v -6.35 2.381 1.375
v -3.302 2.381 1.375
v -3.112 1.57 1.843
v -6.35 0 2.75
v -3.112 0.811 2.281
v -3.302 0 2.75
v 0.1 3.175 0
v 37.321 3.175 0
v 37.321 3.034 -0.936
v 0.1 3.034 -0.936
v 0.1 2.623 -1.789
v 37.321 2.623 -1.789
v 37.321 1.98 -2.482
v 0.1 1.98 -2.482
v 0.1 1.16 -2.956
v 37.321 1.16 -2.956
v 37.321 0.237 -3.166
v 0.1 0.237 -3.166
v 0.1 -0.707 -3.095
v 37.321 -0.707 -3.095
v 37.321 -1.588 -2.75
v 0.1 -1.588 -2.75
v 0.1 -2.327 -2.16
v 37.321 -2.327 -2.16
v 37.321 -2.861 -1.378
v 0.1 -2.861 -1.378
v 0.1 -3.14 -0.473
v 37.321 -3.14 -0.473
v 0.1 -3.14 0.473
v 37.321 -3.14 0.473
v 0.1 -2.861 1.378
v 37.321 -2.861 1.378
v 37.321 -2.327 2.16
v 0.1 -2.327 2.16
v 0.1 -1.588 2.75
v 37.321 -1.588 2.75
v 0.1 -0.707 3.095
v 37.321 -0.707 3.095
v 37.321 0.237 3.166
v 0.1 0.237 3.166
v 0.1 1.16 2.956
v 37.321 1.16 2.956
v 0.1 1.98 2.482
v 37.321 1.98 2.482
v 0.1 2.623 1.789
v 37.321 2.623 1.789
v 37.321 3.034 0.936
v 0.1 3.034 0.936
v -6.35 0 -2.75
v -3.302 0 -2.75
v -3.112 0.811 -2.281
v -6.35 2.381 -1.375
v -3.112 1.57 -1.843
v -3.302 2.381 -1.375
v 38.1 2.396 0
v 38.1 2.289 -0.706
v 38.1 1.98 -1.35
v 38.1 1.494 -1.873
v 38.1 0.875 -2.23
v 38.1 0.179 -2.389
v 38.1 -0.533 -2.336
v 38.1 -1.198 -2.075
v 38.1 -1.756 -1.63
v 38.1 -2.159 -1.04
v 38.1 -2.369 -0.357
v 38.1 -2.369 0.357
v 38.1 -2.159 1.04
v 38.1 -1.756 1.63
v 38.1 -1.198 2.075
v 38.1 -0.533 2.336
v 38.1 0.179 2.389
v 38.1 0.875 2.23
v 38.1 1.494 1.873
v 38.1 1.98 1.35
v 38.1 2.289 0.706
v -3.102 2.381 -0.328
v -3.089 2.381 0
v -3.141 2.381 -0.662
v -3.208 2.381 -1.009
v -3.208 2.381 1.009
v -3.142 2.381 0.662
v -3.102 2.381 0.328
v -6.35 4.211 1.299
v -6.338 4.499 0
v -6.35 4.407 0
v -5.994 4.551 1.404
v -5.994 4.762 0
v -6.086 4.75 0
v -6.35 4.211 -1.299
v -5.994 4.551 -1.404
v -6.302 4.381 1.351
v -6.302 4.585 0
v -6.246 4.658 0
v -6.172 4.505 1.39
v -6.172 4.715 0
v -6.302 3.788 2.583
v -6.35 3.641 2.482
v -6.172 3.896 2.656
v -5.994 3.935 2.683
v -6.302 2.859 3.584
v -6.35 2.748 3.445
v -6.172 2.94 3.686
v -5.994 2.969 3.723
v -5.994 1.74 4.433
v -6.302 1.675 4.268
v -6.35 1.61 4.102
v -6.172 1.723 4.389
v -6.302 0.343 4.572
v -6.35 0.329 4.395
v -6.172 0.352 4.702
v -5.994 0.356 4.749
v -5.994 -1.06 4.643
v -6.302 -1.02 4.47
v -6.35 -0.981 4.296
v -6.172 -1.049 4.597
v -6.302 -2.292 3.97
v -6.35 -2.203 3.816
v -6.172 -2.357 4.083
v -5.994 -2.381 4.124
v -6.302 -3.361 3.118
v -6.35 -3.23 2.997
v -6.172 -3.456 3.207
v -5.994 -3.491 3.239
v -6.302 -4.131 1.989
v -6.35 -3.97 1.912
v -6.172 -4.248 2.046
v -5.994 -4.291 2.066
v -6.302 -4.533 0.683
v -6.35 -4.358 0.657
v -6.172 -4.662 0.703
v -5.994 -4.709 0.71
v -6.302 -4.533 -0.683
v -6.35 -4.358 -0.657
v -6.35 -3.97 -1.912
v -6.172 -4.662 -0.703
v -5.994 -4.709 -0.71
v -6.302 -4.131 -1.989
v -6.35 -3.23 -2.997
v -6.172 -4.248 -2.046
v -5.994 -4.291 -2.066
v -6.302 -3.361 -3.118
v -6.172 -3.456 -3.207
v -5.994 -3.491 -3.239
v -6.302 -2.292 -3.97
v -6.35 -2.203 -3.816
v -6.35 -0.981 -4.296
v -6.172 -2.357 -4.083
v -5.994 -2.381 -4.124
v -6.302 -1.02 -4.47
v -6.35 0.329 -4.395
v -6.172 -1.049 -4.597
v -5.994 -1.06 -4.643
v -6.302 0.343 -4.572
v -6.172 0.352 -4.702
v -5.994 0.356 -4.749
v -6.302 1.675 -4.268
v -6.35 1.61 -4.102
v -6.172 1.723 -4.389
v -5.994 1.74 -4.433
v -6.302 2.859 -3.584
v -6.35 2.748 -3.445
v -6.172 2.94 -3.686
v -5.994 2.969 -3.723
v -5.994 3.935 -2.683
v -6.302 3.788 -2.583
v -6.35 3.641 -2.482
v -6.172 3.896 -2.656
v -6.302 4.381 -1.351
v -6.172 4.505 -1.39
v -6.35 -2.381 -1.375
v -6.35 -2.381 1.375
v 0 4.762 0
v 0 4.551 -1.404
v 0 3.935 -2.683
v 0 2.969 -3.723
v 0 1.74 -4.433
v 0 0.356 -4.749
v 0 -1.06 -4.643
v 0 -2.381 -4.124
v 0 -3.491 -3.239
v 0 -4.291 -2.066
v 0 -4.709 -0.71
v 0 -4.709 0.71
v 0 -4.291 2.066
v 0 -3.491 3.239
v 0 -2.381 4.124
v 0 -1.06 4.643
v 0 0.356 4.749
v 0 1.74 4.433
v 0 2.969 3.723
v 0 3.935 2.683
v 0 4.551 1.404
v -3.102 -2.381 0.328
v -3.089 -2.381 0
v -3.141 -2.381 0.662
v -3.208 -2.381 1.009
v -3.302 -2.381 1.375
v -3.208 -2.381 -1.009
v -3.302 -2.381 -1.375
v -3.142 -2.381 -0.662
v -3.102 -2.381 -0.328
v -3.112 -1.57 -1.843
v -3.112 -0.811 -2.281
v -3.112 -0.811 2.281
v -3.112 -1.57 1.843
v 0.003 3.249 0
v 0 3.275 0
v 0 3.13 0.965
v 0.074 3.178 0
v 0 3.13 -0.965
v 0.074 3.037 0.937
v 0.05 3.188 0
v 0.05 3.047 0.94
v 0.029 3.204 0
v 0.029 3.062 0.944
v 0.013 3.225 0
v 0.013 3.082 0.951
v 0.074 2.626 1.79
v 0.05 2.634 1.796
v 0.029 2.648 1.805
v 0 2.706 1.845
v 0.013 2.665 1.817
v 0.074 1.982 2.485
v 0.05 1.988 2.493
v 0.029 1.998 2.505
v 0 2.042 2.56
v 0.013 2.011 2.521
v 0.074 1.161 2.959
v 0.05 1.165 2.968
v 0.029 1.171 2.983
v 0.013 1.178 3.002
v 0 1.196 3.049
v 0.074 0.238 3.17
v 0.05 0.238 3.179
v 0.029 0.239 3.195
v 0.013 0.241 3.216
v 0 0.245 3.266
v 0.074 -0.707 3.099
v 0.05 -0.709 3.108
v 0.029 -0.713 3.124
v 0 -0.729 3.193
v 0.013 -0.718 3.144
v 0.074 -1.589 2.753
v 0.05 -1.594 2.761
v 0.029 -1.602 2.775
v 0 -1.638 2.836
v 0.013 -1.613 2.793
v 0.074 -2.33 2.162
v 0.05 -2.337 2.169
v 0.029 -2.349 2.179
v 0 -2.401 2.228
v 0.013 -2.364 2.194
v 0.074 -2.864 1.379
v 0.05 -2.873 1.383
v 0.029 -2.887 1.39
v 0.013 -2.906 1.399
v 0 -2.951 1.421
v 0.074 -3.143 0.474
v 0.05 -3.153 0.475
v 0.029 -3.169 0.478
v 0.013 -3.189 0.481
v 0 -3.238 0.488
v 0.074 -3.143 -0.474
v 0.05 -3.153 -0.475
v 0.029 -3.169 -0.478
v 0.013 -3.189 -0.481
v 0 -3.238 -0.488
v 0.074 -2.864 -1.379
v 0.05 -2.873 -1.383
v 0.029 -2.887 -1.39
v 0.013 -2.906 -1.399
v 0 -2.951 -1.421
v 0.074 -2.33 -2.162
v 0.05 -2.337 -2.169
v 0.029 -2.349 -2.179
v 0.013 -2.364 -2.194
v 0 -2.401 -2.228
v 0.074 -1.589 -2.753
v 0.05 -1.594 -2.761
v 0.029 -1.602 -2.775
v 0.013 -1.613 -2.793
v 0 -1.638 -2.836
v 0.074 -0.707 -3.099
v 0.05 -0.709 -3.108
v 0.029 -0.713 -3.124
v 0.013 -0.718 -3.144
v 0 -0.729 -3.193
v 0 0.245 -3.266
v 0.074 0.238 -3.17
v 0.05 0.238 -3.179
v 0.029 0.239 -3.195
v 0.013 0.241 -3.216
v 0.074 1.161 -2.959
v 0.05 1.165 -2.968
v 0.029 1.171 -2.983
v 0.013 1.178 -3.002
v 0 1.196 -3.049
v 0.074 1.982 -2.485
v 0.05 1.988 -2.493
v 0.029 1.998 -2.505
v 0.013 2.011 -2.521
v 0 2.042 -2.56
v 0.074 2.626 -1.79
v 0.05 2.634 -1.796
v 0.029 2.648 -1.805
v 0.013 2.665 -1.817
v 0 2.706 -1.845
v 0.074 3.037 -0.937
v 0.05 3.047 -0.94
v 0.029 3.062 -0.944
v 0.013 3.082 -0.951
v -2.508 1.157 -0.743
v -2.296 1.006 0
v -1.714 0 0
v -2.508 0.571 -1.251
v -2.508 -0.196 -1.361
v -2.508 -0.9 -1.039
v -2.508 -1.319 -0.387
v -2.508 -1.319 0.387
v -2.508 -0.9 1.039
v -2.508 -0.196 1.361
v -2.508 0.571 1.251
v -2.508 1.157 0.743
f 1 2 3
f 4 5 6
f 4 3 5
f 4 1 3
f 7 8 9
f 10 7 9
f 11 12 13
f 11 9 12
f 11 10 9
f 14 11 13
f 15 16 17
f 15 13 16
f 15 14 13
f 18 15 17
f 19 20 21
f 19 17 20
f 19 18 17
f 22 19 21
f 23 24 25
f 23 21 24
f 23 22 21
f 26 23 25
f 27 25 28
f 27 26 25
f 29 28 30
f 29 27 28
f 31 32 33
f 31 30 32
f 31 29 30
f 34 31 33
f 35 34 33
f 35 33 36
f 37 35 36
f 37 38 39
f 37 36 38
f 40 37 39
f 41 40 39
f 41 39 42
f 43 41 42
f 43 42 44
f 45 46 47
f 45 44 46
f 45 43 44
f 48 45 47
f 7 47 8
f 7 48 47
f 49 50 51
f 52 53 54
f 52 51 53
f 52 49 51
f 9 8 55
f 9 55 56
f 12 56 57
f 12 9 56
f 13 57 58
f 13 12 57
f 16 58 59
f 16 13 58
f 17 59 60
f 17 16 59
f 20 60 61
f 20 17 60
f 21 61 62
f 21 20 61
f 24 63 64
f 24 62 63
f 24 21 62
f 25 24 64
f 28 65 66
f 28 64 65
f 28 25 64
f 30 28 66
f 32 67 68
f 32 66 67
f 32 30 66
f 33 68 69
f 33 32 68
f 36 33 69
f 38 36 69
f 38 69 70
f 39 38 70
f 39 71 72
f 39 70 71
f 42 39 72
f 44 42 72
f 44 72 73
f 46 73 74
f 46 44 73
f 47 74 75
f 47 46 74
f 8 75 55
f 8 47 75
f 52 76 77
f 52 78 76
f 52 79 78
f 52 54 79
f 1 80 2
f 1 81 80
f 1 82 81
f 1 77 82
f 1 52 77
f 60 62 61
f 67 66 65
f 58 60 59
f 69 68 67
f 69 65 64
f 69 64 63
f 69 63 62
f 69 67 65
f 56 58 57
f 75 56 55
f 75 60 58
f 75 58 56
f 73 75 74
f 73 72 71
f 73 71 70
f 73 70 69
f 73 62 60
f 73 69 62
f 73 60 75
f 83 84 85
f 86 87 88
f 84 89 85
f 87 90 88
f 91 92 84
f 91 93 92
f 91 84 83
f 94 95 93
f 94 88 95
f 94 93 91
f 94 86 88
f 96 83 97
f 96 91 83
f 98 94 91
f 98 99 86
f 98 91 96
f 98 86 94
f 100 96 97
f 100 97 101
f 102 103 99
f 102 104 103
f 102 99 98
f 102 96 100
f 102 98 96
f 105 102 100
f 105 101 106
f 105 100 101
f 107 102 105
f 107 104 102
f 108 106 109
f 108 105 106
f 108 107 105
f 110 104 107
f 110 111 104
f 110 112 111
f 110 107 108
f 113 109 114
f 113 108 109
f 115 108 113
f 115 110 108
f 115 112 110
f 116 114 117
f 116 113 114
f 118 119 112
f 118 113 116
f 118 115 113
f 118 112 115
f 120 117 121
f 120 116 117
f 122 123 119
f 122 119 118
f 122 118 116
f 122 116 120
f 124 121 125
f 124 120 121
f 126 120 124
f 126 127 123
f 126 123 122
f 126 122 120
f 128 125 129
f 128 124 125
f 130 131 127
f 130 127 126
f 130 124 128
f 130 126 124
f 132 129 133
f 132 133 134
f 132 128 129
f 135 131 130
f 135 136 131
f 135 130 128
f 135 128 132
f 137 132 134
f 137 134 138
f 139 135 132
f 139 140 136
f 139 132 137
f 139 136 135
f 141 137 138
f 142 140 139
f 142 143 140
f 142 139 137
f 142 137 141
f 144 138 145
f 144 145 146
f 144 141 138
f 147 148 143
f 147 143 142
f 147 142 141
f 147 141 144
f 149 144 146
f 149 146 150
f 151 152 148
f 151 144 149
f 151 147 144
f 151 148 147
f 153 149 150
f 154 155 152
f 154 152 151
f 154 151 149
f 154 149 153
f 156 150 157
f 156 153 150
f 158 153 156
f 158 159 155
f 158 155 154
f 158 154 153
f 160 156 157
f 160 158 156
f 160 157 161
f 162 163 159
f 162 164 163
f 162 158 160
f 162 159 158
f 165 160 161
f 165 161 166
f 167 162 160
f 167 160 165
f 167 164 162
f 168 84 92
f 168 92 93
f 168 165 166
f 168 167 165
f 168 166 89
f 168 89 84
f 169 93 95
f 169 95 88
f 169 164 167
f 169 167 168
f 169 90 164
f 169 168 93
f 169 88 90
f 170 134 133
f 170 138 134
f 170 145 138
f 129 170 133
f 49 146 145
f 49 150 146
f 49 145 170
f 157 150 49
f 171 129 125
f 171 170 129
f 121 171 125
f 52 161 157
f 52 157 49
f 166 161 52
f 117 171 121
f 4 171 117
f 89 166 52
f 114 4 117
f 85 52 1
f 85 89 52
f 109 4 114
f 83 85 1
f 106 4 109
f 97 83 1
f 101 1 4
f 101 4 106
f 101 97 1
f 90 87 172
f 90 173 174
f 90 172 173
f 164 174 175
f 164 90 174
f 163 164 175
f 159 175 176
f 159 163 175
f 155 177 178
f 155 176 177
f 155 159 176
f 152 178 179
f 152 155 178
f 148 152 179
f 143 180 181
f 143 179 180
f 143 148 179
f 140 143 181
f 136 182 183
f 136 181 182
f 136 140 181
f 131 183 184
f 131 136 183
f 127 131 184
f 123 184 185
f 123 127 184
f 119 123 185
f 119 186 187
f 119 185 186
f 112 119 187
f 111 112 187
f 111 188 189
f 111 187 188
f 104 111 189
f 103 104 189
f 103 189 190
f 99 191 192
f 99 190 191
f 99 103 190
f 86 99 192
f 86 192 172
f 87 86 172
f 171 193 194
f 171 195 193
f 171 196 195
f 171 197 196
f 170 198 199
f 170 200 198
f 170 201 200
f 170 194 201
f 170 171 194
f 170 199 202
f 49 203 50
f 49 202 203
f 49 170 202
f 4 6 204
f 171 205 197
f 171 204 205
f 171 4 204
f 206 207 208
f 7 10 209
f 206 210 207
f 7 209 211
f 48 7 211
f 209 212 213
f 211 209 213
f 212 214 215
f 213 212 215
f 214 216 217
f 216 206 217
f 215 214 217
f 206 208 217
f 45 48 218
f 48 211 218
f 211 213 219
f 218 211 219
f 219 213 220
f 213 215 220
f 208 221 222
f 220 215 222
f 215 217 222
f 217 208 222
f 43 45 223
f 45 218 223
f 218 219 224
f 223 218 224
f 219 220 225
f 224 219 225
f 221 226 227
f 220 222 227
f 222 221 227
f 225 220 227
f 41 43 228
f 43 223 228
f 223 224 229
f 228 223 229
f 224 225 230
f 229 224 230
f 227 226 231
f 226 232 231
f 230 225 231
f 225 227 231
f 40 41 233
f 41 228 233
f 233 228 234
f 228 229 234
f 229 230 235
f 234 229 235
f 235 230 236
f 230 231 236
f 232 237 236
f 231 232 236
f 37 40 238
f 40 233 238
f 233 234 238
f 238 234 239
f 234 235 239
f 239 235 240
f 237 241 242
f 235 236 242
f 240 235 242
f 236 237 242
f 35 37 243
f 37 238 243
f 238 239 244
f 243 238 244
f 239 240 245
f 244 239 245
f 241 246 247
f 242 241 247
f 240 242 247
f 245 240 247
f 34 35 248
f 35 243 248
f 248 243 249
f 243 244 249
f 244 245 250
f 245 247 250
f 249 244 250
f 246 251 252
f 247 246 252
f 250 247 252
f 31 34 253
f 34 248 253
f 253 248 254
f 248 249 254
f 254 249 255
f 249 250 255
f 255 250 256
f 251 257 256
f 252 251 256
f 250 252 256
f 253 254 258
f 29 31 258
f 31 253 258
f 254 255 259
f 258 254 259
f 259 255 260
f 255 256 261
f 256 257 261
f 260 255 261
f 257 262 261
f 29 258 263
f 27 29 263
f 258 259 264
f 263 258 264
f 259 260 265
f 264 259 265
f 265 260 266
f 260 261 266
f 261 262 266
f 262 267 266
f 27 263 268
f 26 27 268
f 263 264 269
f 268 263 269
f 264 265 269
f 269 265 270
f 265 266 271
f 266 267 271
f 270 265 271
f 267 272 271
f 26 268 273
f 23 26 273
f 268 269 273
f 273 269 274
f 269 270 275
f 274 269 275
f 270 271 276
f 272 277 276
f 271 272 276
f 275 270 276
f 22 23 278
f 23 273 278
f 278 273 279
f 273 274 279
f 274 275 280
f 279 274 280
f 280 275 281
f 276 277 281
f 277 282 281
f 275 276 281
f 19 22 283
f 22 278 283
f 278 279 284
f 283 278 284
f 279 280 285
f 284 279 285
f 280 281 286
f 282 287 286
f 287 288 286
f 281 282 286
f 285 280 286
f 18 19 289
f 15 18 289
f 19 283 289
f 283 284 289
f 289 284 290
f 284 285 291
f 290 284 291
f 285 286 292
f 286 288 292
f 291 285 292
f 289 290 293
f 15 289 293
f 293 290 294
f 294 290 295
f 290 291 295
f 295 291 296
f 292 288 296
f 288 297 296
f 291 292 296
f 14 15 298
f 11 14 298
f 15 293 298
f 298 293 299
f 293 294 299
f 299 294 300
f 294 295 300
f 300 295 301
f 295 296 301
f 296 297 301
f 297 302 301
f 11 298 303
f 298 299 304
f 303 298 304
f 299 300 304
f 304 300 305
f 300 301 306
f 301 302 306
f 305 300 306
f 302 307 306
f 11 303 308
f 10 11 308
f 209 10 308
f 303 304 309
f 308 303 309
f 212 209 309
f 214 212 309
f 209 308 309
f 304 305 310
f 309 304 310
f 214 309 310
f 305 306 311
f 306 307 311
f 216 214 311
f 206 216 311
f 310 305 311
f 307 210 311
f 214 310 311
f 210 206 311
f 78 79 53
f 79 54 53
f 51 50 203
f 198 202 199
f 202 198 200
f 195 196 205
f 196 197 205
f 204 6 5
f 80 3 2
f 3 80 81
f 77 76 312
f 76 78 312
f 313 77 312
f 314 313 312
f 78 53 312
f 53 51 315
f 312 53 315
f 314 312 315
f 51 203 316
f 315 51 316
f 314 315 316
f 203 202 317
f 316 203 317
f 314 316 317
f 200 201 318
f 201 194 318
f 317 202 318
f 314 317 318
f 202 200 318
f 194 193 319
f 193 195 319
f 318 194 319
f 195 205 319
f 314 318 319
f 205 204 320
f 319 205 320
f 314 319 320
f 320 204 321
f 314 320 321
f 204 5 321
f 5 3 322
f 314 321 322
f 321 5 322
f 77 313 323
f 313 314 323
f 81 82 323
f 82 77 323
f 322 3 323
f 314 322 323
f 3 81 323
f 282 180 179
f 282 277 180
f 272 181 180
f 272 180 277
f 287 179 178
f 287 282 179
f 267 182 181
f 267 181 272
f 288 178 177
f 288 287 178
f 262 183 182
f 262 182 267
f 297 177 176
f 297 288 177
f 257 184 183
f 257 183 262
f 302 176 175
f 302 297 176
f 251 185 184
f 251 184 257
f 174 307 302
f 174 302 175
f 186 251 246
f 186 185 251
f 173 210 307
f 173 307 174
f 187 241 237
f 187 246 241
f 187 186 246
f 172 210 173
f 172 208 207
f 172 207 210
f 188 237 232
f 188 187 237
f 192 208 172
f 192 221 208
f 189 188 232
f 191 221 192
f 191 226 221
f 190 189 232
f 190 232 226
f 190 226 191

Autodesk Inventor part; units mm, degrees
ref_plane "YZ Plane" through (0, 0, 0) normal (1, 0, 0) x (0, 1, 0)
ref_plane "XZ Plane" through (0, 0, 0) normal (0, 1, 0) x (-1, 0, 0)
sketch "Sketch1" plane through (0, 0, 0) normal (0, 0, 1) x (1, 0, 0)
  line L0 (-1.7145, 0) -> (38.1, 0)
  line L1 (38.1, 0) -> (38.1, 3.175)
  line L2 (38.1, 3.175) -> (12.7, 3.175)
  line L3 (12.7, 3.175) -> (10.1599, 3.175)
  line L4 (10.1599, 3.175) -> (0, 3.175)
  line L5 (0, 3.175) -> (0, 4.7625)
  line L6 (0, 4.7625) -> (-6.35, 4.7625)
  line L7 (-6.35, 4.7625) -> (-6.35, 2.7496)
  line L8 (-6.35, 2.7496) -> (-3.302, 2.7496)
  line L9 (-3.302, 2.7496) -> (-1.7145, 0)
  line L10 (-15.24, 0) -> (46.99, 0) projected
  line L11 (0, -0.9525) -> (0, 5.715) projected
  line L12 (12.7, 3.175) -> (0, 3.175) construction
  dimension "d1" = 25.4
  dimension "d2" = 2.5401
  dimension "d3" = 6.35
  dimension "d4" = 3.048
  dimension "d5" = 60
  dimension "d6" = 6.35
  dimension "d7" = 6.35
  dimension "d8" = 5.4993
  dimension "d9" = 9.525
  dimension "d26" = 38.1
revolve "Body" add sketch "Sketch1" angle 360 about axis through (-1.7145, 0, 0) along (1, 0, 0)
sketch "Sketch2" plane through (-6.35, 0, 0) normal (-1, 0, 0) x (0, 0, 1)
  circle A0 centre (0, 0) radius 2.7496 projected
  line L0 (0, -6.6675) -> (0, 6.6675) projected
  line L1 (-6.6675, 0) -> (6.6675, 0) projected
  line L2 (2.7496, 0) -> (1.3748, -2.3812)
  line L3 (1.3748, -2.3812) -> (-1.3748, -2.3813)
  line L4 (-1.3748, -2.3813) -> (-2.7496, 0)
  line L5 (-2.7496, 0) -> (-1.3748, 2.3812)
  line L6 (-1.3748, 2.3812) -> (1.3748, 2.3813)
  line L7 (1.3748, 2.3813) -> (2.7496, 0)
extrude "Slot" add sketch "Sketch2" against normal up to next contours L7 A0 | A0 L2 | L6 L0 A0 | A0 L0 L3 | L0 L6 A0 | A0 L3 L0 | L4 A0 | A0 L5
fillet "Fillet1" radius 0.3556 1 edges at (-6.35, -4.7625, 0)
thread "Thread" size "1/4-20 UNC" class "2A" standard "ANSI Unified Screw Threads" length 25.4
chamfer "Chamfer1" distance 0.7791 distance2 0.779 1 edges at (38.1, -3.175, 0) measured on face at (38.1, -0.6107, -1.4381)
ref_plane "Work Plane1" through (29, 0, 0) normal (0, -1, 0) x (1, 0, 0)
fillet "Fillet2" radius 0.1 1 edges at (0, -3.175, 0)
equation "\"d30\" = R"
equation "\"d17\" = RR"
equation "\"d13\" = GEL"
equation "\"d15\" = -0.5 * SPD + 0.5 * GD"
equation "\"d16\" = GUL"
equation "\"d1\" = GEL"
equation "\"d3\" = KOH"
equation "\"d4\" = INTI"
equation "\"d6\" = GD"
equation "\"d7\" = BDM"
equation "\"d8\" = 1.1547 * SW"
equation "\"d9\" = KOD"
equation "\"d26\" = NLG"
equation "\"GD\" = NND"
equation "\"NLG\" = 38.1"
equation "\"GEL\" = 25.4"
equation "\"KOD\" = 9.525"
equation "\"KOH\" = NND"
equation "\"INTI\" = 3.048"
equation "\"GAL\" = 2.54"
equation "\"GUL\" = 0.77902"
equation "\"BDM\" = NND"
equation "\"SW\" = 4.7625"
equation "\"RR\" = 0.3556"
equation "\"SPD\" = GD1"
equation "\"R\" = 0.1"
equation "\"PHH\" = 0.1 * NND"
equation "\"THREADDIA\" = 6.35"
equation "\"FAWI\" = 45deg"
equation "\"NND\" = 6.35"
equation "\"E0\" = 1.155 * SW"
equation "\"FAWI1\" = 30deg"
equation "\"TOA\" = 30deg"
equation "\"GD1\" = 4.79189"
properties part number "Unbrako - 1/4 x 1 1/2" material "Steel, Mild"
